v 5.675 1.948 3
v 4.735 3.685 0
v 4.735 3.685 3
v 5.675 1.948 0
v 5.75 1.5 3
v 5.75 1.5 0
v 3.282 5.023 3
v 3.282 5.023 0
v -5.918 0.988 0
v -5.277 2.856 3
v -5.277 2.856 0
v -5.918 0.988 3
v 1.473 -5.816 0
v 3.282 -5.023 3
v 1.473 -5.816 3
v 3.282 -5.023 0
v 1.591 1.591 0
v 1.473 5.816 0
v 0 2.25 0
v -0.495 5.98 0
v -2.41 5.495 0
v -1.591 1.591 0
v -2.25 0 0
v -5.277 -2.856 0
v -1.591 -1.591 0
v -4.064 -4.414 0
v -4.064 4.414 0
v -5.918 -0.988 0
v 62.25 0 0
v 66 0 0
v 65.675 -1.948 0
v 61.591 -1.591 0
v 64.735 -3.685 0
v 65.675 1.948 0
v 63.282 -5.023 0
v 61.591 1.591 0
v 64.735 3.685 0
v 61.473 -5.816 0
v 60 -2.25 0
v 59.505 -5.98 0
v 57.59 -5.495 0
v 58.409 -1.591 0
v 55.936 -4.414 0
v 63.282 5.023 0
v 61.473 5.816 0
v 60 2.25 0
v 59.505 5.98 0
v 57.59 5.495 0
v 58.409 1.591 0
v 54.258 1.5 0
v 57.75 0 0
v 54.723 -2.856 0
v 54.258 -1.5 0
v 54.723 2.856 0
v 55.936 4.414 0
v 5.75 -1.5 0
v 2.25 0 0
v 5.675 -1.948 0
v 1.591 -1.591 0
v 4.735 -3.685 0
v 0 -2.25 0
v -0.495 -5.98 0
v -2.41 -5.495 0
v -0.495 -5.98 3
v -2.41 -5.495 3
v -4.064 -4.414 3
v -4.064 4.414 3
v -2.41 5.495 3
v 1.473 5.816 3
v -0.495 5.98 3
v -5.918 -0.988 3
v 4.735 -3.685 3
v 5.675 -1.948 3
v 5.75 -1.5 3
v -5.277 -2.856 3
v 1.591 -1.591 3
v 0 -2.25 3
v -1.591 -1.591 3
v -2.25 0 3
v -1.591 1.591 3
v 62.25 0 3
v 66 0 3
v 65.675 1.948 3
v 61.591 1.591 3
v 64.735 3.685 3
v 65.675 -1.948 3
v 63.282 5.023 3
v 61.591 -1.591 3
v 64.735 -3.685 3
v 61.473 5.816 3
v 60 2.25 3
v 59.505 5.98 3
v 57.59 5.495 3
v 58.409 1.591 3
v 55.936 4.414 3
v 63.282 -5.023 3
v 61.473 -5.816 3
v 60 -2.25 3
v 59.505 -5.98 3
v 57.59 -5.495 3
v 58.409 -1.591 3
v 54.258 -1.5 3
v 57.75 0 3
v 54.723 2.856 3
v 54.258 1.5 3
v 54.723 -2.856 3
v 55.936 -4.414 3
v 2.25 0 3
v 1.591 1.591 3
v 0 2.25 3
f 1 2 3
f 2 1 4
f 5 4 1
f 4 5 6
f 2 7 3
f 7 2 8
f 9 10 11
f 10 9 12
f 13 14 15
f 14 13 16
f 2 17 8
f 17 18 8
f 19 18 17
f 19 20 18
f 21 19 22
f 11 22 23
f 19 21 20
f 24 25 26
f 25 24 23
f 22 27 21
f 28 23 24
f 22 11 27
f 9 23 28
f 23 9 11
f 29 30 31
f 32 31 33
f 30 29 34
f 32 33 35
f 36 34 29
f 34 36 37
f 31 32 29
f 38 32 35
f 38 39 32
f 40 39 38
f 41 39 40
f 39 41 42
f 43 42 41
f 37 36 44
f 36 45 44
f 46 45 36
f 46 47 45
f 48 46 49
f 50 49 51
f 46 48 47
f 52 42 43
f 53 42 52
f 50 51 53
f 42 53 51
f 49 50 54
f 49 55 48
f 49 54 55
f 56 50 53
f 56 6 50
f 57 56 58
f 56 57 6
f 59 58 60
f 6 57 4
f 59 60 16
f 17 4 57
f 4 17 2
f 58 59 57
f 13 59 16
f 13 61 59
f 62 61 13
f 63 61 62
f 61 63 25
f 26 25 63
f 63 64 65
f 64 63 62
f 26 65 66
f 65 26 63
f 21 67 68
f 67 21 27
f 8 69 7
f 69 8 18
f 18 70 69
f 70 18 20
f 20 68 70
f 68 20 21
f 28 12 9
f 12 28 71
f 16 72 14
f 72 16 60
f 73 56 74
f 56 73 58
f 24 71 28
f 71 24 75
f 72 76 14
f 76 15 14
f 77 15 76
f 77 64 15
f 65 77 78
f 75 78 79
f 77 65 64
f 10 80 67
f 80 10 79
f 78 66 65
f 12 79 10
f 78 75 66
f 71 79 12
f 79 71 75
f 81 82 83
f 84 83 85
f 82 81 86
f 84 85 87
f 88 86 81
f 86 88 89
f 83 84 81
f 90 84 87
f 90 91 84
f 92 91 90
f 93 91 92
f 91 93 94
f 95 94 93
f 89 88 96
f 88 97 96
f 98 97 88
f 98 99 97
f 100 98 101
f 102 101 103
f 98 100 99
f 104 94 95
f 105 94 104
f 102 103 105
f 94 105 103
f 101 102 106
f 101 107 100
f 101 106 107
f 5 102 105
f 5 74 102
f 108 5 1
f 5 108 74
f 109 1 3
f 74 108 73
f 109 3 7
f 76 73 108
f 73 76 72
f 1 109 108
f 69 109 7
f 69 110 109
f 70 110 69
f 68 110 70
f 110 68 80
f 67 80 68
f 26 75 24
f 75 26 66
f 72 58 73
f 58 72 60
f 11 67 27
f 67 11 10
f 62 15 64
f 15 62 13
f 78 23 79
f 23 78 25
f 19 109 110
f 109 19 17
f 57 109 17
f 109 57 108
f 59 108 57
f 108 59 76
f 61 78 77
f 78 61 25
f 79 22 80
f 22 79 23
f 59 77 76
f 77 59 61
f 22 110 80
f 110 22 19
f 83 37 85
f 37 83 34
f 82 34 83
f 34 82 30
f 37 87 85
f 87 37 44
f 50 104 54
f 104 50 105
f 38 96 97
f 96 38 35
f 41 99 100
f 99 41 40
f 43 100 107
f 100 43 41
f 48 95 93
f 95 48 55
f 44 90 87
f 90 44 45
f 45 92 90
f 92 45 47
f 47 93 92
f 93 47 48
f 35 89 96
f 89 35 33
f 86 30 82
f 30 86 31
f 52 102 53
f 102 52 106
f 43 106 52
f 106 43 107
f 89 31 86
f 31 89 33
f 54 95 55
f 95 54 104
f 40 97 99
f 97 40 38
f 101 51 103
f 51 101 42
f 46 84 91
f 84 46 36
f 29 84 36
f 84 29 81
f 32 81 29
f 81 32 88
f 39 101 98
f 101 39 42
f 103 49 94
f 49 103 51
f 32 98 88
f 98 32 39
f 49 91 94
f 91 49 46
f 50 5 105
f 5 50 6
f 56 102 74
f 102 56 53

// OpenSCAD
height = 3; //mm
screw = 4.5; //mm, actually M3 but allow for squoojing
thick = 3;//

length = 60;


joint();
translate([length,0,0]) joint();
translate([thick,-(thick/2),0]) cube([length-(2*thick), thick, height]);

module joint(){
difference(){
	cylinder(h=height, d=thick + (2*screw));
	cylinder(h=height, d=screw);
	}
}
